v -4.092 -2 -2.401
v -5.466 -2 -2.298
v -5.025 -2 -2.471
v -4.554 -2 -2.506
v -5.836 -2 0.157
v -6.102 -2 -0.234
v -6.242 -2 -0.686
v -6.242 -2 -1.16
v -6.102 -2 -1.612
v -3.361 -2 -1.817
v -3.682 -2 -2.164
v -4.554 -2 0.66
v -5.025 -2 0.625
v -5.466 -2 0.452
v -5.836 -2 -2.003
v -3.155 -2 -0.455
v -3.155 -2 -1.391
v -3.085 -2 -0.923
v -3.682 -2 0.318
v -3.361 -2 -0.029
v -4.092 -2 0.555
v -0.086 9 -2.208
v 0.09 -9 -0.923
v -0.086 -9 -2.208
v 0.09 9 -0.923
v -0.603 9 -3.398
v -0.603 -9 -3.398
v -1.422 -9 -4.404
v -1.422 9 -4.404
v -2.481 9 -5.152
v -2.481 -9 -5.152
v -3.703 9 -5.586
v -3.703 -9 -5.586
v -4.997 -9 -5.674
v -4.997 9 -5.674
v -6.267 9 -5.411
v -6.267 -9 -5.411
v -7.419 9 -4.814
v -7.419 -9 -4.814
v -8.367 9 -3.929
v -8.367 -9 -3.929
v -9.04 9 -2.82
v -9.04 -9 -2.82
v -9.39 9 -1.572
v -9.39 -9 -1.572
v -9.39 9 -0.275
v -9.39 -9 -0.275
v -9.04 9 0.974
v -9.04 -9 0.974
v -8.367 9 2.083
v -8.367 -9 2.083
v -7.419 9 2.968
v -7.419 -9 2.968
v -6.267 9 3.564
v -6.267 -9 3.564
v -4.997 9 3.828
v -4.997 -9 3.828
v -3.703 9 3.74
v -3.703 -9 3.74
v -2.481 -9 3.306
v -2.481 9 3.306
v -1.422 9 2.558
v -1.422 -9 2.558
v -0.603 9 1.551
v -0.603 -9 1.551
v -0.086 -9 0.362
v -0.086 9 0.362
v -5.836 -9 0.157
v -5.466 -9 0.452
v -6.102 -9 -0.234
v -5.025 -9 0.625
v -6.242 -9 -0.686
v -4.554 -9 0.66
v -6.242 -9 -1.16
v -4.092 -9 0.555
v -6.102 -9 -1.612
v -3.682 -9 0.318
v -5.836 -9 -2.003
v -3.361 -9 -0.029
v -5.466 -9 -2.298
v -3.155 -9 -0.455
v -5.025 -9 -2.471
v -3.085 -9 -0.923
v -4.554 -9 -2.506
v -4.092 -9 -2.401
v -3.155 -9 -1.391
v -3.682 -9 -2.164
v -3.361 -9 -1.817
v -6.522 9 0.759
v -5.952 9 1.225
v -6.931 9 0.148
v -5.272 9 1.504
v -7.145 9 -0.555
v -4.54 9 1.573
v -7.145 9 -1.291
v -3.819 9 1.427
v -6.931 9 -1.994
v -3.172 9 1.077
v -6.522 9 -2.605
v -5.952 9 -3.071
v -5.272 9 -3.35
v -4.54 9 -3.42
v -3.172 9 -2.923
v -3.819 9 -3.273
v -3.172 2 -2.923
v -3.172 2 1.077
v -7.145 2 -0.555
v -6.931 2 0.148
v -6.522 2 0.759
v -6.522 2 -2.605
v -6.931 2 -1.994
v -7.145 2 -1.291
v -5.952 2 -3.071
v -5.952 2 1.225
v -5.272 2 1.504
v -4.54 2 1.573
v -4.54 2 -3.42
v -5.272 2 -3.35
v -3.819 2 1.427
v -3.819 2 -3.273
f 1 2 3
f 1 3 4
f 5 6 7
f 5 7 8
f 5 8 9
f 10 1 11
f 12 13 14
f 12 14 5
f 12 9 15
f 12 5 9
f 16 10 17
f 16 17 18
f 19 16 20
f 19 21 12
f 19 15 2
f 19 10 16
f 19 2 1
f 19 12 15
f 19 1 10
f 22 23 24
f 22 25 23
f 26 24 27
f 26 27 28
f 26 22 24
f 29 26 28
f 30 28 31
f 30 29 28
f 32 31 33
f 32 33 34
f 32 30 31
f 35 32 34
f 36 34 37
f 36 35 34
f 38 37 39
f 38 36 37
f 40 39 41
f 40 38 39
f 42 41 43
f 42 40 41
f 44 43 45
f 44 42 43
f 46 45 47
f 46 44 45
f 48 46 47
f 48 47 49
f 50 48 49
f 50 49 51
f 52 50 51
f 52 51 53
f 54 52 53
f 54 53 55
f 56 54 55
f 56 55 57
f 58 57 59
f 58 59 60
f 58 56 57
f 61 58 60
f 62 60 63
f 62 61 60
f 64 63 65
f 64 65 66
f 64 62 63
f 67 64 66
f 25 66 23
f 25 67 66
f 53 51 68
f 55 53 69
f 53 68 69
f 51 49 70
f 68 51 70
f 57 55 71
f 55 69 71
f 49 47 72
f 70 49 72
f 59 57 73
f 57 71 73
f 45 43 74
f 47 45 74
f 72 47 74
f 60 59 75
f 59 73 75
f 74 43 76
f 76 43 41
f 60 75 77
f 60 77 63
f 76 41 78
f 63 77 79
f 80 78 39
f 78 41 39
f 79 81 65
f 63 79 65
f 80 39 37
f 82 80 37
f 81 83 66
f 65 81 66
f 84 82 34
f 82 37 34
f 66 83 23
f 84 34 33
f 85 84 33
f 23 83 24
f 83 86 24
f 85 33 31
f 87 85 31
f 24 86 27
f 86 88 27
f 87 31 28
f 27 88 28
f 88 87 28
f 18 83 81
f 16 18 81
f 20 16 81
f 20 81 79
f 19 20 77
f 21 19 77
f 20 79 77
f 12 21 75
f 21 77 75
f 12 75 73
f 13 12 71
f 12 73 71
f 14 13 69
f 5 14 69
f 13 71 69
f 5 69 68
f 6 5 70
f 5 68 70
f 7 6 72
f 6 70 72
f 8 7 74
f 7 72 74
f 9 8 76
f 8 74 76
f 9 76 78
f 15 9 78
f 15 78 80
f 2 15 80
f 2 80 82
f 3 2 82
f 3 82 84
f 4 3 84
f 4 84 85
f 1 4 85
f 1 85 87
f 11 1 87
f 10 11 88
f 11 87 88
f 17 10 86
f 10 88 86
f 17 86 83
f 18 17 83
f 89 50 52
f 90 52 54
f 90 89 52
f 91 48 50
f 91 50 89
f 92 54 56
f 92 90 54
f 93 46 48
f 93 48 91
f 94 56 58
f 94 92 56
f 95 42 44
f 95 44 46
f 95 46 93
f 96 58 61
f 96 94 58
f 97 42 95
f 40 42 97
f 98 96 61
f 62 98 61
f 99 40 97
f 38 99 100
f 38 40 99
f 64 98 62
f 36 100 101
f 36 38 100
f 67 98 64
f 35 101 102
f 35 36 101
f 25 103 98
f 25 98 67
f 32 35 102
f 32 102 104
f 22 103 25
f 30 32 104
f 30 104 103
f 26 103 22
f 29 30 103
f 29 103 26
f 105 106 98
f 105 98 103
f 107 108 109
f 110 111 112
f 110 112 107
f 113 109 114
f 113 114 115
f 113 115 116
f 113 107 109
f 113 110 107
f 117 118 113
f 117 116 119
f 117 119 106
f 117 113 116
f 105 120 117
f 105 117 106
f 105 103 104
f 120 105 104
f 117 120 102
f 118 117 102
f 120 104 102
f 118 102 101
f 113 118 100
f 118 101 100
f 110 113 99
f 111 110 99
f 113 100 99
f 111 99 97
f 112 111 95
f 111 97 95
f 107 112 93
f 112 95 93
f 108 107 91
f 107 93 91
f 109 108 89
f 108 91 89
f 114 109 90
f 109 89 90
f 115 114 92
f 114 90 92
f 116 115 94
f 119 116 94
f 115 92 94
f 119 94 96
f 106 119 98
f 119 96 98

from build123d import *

# Parameters (mm, degrees)
BOSS_EXTRUDE1_DEPTH      = 9
BOSS_EXTRUDE1_DEPTH_BACK = 9
SKETCH1_R                = 4.7625
CUT_EXTRUDE1_DEPTH       = 7
SKETCH7_R                = 1.5875
CUT_EXTRUDE2_DEPTH       = 7


with BuildPart() as part:
    # Sketch1 → Boss-Extrude1 (new, two sides: drawn at the far end of the back side and taken through both)
    with BuildSketch(Plane(origin=(0, 0, 0), x_dir=(1, 0, 0), z_dir=(0, 1, 0)).offset(-BOSS_EXTRUDE1_DEPTH_BACK)):
        with Locations((-4.672198487, 0.923020882)):
            Circle(SKETCH1_R)
    extrude(amount=BOSS_EXTRUDE1_DEPTH + BOSS_EXTRUDE1_DEPTH_BACK)

    # Sketch6 → Cut-Extrude1 (cut)
    with BuildSketch(Plane(origin=(0, 9, 0), x_dir=(1, 0, 0), z_dir=(0, 1, 0))):
        with BuildLine():
            Line((-3.172198487, -1.076979118), (-3.172198487, 2.923020882))
            ThreePointArc((-3.172198487, 2.923020882), (-7.172198487, 0.923020882), (-3.172198487, -1.076979118))
        make_face()
    extrude(amount=-CUT_EXTRUDE1_DEPTH, mode=Mode.SUBTRACT)

    # Sketch7 → Cut-Extrude2 (cut)
    with BuildSketch(Plane.XZ.offset(9)):
        with Locations((-4.672198487, -0.923020882)):
            Circle(SKETCH7_R)
    extrude(amount=-CUT_EXTRUDE2_DEPTH, mode=Mode.SUBTRACT)


solid = part.part
